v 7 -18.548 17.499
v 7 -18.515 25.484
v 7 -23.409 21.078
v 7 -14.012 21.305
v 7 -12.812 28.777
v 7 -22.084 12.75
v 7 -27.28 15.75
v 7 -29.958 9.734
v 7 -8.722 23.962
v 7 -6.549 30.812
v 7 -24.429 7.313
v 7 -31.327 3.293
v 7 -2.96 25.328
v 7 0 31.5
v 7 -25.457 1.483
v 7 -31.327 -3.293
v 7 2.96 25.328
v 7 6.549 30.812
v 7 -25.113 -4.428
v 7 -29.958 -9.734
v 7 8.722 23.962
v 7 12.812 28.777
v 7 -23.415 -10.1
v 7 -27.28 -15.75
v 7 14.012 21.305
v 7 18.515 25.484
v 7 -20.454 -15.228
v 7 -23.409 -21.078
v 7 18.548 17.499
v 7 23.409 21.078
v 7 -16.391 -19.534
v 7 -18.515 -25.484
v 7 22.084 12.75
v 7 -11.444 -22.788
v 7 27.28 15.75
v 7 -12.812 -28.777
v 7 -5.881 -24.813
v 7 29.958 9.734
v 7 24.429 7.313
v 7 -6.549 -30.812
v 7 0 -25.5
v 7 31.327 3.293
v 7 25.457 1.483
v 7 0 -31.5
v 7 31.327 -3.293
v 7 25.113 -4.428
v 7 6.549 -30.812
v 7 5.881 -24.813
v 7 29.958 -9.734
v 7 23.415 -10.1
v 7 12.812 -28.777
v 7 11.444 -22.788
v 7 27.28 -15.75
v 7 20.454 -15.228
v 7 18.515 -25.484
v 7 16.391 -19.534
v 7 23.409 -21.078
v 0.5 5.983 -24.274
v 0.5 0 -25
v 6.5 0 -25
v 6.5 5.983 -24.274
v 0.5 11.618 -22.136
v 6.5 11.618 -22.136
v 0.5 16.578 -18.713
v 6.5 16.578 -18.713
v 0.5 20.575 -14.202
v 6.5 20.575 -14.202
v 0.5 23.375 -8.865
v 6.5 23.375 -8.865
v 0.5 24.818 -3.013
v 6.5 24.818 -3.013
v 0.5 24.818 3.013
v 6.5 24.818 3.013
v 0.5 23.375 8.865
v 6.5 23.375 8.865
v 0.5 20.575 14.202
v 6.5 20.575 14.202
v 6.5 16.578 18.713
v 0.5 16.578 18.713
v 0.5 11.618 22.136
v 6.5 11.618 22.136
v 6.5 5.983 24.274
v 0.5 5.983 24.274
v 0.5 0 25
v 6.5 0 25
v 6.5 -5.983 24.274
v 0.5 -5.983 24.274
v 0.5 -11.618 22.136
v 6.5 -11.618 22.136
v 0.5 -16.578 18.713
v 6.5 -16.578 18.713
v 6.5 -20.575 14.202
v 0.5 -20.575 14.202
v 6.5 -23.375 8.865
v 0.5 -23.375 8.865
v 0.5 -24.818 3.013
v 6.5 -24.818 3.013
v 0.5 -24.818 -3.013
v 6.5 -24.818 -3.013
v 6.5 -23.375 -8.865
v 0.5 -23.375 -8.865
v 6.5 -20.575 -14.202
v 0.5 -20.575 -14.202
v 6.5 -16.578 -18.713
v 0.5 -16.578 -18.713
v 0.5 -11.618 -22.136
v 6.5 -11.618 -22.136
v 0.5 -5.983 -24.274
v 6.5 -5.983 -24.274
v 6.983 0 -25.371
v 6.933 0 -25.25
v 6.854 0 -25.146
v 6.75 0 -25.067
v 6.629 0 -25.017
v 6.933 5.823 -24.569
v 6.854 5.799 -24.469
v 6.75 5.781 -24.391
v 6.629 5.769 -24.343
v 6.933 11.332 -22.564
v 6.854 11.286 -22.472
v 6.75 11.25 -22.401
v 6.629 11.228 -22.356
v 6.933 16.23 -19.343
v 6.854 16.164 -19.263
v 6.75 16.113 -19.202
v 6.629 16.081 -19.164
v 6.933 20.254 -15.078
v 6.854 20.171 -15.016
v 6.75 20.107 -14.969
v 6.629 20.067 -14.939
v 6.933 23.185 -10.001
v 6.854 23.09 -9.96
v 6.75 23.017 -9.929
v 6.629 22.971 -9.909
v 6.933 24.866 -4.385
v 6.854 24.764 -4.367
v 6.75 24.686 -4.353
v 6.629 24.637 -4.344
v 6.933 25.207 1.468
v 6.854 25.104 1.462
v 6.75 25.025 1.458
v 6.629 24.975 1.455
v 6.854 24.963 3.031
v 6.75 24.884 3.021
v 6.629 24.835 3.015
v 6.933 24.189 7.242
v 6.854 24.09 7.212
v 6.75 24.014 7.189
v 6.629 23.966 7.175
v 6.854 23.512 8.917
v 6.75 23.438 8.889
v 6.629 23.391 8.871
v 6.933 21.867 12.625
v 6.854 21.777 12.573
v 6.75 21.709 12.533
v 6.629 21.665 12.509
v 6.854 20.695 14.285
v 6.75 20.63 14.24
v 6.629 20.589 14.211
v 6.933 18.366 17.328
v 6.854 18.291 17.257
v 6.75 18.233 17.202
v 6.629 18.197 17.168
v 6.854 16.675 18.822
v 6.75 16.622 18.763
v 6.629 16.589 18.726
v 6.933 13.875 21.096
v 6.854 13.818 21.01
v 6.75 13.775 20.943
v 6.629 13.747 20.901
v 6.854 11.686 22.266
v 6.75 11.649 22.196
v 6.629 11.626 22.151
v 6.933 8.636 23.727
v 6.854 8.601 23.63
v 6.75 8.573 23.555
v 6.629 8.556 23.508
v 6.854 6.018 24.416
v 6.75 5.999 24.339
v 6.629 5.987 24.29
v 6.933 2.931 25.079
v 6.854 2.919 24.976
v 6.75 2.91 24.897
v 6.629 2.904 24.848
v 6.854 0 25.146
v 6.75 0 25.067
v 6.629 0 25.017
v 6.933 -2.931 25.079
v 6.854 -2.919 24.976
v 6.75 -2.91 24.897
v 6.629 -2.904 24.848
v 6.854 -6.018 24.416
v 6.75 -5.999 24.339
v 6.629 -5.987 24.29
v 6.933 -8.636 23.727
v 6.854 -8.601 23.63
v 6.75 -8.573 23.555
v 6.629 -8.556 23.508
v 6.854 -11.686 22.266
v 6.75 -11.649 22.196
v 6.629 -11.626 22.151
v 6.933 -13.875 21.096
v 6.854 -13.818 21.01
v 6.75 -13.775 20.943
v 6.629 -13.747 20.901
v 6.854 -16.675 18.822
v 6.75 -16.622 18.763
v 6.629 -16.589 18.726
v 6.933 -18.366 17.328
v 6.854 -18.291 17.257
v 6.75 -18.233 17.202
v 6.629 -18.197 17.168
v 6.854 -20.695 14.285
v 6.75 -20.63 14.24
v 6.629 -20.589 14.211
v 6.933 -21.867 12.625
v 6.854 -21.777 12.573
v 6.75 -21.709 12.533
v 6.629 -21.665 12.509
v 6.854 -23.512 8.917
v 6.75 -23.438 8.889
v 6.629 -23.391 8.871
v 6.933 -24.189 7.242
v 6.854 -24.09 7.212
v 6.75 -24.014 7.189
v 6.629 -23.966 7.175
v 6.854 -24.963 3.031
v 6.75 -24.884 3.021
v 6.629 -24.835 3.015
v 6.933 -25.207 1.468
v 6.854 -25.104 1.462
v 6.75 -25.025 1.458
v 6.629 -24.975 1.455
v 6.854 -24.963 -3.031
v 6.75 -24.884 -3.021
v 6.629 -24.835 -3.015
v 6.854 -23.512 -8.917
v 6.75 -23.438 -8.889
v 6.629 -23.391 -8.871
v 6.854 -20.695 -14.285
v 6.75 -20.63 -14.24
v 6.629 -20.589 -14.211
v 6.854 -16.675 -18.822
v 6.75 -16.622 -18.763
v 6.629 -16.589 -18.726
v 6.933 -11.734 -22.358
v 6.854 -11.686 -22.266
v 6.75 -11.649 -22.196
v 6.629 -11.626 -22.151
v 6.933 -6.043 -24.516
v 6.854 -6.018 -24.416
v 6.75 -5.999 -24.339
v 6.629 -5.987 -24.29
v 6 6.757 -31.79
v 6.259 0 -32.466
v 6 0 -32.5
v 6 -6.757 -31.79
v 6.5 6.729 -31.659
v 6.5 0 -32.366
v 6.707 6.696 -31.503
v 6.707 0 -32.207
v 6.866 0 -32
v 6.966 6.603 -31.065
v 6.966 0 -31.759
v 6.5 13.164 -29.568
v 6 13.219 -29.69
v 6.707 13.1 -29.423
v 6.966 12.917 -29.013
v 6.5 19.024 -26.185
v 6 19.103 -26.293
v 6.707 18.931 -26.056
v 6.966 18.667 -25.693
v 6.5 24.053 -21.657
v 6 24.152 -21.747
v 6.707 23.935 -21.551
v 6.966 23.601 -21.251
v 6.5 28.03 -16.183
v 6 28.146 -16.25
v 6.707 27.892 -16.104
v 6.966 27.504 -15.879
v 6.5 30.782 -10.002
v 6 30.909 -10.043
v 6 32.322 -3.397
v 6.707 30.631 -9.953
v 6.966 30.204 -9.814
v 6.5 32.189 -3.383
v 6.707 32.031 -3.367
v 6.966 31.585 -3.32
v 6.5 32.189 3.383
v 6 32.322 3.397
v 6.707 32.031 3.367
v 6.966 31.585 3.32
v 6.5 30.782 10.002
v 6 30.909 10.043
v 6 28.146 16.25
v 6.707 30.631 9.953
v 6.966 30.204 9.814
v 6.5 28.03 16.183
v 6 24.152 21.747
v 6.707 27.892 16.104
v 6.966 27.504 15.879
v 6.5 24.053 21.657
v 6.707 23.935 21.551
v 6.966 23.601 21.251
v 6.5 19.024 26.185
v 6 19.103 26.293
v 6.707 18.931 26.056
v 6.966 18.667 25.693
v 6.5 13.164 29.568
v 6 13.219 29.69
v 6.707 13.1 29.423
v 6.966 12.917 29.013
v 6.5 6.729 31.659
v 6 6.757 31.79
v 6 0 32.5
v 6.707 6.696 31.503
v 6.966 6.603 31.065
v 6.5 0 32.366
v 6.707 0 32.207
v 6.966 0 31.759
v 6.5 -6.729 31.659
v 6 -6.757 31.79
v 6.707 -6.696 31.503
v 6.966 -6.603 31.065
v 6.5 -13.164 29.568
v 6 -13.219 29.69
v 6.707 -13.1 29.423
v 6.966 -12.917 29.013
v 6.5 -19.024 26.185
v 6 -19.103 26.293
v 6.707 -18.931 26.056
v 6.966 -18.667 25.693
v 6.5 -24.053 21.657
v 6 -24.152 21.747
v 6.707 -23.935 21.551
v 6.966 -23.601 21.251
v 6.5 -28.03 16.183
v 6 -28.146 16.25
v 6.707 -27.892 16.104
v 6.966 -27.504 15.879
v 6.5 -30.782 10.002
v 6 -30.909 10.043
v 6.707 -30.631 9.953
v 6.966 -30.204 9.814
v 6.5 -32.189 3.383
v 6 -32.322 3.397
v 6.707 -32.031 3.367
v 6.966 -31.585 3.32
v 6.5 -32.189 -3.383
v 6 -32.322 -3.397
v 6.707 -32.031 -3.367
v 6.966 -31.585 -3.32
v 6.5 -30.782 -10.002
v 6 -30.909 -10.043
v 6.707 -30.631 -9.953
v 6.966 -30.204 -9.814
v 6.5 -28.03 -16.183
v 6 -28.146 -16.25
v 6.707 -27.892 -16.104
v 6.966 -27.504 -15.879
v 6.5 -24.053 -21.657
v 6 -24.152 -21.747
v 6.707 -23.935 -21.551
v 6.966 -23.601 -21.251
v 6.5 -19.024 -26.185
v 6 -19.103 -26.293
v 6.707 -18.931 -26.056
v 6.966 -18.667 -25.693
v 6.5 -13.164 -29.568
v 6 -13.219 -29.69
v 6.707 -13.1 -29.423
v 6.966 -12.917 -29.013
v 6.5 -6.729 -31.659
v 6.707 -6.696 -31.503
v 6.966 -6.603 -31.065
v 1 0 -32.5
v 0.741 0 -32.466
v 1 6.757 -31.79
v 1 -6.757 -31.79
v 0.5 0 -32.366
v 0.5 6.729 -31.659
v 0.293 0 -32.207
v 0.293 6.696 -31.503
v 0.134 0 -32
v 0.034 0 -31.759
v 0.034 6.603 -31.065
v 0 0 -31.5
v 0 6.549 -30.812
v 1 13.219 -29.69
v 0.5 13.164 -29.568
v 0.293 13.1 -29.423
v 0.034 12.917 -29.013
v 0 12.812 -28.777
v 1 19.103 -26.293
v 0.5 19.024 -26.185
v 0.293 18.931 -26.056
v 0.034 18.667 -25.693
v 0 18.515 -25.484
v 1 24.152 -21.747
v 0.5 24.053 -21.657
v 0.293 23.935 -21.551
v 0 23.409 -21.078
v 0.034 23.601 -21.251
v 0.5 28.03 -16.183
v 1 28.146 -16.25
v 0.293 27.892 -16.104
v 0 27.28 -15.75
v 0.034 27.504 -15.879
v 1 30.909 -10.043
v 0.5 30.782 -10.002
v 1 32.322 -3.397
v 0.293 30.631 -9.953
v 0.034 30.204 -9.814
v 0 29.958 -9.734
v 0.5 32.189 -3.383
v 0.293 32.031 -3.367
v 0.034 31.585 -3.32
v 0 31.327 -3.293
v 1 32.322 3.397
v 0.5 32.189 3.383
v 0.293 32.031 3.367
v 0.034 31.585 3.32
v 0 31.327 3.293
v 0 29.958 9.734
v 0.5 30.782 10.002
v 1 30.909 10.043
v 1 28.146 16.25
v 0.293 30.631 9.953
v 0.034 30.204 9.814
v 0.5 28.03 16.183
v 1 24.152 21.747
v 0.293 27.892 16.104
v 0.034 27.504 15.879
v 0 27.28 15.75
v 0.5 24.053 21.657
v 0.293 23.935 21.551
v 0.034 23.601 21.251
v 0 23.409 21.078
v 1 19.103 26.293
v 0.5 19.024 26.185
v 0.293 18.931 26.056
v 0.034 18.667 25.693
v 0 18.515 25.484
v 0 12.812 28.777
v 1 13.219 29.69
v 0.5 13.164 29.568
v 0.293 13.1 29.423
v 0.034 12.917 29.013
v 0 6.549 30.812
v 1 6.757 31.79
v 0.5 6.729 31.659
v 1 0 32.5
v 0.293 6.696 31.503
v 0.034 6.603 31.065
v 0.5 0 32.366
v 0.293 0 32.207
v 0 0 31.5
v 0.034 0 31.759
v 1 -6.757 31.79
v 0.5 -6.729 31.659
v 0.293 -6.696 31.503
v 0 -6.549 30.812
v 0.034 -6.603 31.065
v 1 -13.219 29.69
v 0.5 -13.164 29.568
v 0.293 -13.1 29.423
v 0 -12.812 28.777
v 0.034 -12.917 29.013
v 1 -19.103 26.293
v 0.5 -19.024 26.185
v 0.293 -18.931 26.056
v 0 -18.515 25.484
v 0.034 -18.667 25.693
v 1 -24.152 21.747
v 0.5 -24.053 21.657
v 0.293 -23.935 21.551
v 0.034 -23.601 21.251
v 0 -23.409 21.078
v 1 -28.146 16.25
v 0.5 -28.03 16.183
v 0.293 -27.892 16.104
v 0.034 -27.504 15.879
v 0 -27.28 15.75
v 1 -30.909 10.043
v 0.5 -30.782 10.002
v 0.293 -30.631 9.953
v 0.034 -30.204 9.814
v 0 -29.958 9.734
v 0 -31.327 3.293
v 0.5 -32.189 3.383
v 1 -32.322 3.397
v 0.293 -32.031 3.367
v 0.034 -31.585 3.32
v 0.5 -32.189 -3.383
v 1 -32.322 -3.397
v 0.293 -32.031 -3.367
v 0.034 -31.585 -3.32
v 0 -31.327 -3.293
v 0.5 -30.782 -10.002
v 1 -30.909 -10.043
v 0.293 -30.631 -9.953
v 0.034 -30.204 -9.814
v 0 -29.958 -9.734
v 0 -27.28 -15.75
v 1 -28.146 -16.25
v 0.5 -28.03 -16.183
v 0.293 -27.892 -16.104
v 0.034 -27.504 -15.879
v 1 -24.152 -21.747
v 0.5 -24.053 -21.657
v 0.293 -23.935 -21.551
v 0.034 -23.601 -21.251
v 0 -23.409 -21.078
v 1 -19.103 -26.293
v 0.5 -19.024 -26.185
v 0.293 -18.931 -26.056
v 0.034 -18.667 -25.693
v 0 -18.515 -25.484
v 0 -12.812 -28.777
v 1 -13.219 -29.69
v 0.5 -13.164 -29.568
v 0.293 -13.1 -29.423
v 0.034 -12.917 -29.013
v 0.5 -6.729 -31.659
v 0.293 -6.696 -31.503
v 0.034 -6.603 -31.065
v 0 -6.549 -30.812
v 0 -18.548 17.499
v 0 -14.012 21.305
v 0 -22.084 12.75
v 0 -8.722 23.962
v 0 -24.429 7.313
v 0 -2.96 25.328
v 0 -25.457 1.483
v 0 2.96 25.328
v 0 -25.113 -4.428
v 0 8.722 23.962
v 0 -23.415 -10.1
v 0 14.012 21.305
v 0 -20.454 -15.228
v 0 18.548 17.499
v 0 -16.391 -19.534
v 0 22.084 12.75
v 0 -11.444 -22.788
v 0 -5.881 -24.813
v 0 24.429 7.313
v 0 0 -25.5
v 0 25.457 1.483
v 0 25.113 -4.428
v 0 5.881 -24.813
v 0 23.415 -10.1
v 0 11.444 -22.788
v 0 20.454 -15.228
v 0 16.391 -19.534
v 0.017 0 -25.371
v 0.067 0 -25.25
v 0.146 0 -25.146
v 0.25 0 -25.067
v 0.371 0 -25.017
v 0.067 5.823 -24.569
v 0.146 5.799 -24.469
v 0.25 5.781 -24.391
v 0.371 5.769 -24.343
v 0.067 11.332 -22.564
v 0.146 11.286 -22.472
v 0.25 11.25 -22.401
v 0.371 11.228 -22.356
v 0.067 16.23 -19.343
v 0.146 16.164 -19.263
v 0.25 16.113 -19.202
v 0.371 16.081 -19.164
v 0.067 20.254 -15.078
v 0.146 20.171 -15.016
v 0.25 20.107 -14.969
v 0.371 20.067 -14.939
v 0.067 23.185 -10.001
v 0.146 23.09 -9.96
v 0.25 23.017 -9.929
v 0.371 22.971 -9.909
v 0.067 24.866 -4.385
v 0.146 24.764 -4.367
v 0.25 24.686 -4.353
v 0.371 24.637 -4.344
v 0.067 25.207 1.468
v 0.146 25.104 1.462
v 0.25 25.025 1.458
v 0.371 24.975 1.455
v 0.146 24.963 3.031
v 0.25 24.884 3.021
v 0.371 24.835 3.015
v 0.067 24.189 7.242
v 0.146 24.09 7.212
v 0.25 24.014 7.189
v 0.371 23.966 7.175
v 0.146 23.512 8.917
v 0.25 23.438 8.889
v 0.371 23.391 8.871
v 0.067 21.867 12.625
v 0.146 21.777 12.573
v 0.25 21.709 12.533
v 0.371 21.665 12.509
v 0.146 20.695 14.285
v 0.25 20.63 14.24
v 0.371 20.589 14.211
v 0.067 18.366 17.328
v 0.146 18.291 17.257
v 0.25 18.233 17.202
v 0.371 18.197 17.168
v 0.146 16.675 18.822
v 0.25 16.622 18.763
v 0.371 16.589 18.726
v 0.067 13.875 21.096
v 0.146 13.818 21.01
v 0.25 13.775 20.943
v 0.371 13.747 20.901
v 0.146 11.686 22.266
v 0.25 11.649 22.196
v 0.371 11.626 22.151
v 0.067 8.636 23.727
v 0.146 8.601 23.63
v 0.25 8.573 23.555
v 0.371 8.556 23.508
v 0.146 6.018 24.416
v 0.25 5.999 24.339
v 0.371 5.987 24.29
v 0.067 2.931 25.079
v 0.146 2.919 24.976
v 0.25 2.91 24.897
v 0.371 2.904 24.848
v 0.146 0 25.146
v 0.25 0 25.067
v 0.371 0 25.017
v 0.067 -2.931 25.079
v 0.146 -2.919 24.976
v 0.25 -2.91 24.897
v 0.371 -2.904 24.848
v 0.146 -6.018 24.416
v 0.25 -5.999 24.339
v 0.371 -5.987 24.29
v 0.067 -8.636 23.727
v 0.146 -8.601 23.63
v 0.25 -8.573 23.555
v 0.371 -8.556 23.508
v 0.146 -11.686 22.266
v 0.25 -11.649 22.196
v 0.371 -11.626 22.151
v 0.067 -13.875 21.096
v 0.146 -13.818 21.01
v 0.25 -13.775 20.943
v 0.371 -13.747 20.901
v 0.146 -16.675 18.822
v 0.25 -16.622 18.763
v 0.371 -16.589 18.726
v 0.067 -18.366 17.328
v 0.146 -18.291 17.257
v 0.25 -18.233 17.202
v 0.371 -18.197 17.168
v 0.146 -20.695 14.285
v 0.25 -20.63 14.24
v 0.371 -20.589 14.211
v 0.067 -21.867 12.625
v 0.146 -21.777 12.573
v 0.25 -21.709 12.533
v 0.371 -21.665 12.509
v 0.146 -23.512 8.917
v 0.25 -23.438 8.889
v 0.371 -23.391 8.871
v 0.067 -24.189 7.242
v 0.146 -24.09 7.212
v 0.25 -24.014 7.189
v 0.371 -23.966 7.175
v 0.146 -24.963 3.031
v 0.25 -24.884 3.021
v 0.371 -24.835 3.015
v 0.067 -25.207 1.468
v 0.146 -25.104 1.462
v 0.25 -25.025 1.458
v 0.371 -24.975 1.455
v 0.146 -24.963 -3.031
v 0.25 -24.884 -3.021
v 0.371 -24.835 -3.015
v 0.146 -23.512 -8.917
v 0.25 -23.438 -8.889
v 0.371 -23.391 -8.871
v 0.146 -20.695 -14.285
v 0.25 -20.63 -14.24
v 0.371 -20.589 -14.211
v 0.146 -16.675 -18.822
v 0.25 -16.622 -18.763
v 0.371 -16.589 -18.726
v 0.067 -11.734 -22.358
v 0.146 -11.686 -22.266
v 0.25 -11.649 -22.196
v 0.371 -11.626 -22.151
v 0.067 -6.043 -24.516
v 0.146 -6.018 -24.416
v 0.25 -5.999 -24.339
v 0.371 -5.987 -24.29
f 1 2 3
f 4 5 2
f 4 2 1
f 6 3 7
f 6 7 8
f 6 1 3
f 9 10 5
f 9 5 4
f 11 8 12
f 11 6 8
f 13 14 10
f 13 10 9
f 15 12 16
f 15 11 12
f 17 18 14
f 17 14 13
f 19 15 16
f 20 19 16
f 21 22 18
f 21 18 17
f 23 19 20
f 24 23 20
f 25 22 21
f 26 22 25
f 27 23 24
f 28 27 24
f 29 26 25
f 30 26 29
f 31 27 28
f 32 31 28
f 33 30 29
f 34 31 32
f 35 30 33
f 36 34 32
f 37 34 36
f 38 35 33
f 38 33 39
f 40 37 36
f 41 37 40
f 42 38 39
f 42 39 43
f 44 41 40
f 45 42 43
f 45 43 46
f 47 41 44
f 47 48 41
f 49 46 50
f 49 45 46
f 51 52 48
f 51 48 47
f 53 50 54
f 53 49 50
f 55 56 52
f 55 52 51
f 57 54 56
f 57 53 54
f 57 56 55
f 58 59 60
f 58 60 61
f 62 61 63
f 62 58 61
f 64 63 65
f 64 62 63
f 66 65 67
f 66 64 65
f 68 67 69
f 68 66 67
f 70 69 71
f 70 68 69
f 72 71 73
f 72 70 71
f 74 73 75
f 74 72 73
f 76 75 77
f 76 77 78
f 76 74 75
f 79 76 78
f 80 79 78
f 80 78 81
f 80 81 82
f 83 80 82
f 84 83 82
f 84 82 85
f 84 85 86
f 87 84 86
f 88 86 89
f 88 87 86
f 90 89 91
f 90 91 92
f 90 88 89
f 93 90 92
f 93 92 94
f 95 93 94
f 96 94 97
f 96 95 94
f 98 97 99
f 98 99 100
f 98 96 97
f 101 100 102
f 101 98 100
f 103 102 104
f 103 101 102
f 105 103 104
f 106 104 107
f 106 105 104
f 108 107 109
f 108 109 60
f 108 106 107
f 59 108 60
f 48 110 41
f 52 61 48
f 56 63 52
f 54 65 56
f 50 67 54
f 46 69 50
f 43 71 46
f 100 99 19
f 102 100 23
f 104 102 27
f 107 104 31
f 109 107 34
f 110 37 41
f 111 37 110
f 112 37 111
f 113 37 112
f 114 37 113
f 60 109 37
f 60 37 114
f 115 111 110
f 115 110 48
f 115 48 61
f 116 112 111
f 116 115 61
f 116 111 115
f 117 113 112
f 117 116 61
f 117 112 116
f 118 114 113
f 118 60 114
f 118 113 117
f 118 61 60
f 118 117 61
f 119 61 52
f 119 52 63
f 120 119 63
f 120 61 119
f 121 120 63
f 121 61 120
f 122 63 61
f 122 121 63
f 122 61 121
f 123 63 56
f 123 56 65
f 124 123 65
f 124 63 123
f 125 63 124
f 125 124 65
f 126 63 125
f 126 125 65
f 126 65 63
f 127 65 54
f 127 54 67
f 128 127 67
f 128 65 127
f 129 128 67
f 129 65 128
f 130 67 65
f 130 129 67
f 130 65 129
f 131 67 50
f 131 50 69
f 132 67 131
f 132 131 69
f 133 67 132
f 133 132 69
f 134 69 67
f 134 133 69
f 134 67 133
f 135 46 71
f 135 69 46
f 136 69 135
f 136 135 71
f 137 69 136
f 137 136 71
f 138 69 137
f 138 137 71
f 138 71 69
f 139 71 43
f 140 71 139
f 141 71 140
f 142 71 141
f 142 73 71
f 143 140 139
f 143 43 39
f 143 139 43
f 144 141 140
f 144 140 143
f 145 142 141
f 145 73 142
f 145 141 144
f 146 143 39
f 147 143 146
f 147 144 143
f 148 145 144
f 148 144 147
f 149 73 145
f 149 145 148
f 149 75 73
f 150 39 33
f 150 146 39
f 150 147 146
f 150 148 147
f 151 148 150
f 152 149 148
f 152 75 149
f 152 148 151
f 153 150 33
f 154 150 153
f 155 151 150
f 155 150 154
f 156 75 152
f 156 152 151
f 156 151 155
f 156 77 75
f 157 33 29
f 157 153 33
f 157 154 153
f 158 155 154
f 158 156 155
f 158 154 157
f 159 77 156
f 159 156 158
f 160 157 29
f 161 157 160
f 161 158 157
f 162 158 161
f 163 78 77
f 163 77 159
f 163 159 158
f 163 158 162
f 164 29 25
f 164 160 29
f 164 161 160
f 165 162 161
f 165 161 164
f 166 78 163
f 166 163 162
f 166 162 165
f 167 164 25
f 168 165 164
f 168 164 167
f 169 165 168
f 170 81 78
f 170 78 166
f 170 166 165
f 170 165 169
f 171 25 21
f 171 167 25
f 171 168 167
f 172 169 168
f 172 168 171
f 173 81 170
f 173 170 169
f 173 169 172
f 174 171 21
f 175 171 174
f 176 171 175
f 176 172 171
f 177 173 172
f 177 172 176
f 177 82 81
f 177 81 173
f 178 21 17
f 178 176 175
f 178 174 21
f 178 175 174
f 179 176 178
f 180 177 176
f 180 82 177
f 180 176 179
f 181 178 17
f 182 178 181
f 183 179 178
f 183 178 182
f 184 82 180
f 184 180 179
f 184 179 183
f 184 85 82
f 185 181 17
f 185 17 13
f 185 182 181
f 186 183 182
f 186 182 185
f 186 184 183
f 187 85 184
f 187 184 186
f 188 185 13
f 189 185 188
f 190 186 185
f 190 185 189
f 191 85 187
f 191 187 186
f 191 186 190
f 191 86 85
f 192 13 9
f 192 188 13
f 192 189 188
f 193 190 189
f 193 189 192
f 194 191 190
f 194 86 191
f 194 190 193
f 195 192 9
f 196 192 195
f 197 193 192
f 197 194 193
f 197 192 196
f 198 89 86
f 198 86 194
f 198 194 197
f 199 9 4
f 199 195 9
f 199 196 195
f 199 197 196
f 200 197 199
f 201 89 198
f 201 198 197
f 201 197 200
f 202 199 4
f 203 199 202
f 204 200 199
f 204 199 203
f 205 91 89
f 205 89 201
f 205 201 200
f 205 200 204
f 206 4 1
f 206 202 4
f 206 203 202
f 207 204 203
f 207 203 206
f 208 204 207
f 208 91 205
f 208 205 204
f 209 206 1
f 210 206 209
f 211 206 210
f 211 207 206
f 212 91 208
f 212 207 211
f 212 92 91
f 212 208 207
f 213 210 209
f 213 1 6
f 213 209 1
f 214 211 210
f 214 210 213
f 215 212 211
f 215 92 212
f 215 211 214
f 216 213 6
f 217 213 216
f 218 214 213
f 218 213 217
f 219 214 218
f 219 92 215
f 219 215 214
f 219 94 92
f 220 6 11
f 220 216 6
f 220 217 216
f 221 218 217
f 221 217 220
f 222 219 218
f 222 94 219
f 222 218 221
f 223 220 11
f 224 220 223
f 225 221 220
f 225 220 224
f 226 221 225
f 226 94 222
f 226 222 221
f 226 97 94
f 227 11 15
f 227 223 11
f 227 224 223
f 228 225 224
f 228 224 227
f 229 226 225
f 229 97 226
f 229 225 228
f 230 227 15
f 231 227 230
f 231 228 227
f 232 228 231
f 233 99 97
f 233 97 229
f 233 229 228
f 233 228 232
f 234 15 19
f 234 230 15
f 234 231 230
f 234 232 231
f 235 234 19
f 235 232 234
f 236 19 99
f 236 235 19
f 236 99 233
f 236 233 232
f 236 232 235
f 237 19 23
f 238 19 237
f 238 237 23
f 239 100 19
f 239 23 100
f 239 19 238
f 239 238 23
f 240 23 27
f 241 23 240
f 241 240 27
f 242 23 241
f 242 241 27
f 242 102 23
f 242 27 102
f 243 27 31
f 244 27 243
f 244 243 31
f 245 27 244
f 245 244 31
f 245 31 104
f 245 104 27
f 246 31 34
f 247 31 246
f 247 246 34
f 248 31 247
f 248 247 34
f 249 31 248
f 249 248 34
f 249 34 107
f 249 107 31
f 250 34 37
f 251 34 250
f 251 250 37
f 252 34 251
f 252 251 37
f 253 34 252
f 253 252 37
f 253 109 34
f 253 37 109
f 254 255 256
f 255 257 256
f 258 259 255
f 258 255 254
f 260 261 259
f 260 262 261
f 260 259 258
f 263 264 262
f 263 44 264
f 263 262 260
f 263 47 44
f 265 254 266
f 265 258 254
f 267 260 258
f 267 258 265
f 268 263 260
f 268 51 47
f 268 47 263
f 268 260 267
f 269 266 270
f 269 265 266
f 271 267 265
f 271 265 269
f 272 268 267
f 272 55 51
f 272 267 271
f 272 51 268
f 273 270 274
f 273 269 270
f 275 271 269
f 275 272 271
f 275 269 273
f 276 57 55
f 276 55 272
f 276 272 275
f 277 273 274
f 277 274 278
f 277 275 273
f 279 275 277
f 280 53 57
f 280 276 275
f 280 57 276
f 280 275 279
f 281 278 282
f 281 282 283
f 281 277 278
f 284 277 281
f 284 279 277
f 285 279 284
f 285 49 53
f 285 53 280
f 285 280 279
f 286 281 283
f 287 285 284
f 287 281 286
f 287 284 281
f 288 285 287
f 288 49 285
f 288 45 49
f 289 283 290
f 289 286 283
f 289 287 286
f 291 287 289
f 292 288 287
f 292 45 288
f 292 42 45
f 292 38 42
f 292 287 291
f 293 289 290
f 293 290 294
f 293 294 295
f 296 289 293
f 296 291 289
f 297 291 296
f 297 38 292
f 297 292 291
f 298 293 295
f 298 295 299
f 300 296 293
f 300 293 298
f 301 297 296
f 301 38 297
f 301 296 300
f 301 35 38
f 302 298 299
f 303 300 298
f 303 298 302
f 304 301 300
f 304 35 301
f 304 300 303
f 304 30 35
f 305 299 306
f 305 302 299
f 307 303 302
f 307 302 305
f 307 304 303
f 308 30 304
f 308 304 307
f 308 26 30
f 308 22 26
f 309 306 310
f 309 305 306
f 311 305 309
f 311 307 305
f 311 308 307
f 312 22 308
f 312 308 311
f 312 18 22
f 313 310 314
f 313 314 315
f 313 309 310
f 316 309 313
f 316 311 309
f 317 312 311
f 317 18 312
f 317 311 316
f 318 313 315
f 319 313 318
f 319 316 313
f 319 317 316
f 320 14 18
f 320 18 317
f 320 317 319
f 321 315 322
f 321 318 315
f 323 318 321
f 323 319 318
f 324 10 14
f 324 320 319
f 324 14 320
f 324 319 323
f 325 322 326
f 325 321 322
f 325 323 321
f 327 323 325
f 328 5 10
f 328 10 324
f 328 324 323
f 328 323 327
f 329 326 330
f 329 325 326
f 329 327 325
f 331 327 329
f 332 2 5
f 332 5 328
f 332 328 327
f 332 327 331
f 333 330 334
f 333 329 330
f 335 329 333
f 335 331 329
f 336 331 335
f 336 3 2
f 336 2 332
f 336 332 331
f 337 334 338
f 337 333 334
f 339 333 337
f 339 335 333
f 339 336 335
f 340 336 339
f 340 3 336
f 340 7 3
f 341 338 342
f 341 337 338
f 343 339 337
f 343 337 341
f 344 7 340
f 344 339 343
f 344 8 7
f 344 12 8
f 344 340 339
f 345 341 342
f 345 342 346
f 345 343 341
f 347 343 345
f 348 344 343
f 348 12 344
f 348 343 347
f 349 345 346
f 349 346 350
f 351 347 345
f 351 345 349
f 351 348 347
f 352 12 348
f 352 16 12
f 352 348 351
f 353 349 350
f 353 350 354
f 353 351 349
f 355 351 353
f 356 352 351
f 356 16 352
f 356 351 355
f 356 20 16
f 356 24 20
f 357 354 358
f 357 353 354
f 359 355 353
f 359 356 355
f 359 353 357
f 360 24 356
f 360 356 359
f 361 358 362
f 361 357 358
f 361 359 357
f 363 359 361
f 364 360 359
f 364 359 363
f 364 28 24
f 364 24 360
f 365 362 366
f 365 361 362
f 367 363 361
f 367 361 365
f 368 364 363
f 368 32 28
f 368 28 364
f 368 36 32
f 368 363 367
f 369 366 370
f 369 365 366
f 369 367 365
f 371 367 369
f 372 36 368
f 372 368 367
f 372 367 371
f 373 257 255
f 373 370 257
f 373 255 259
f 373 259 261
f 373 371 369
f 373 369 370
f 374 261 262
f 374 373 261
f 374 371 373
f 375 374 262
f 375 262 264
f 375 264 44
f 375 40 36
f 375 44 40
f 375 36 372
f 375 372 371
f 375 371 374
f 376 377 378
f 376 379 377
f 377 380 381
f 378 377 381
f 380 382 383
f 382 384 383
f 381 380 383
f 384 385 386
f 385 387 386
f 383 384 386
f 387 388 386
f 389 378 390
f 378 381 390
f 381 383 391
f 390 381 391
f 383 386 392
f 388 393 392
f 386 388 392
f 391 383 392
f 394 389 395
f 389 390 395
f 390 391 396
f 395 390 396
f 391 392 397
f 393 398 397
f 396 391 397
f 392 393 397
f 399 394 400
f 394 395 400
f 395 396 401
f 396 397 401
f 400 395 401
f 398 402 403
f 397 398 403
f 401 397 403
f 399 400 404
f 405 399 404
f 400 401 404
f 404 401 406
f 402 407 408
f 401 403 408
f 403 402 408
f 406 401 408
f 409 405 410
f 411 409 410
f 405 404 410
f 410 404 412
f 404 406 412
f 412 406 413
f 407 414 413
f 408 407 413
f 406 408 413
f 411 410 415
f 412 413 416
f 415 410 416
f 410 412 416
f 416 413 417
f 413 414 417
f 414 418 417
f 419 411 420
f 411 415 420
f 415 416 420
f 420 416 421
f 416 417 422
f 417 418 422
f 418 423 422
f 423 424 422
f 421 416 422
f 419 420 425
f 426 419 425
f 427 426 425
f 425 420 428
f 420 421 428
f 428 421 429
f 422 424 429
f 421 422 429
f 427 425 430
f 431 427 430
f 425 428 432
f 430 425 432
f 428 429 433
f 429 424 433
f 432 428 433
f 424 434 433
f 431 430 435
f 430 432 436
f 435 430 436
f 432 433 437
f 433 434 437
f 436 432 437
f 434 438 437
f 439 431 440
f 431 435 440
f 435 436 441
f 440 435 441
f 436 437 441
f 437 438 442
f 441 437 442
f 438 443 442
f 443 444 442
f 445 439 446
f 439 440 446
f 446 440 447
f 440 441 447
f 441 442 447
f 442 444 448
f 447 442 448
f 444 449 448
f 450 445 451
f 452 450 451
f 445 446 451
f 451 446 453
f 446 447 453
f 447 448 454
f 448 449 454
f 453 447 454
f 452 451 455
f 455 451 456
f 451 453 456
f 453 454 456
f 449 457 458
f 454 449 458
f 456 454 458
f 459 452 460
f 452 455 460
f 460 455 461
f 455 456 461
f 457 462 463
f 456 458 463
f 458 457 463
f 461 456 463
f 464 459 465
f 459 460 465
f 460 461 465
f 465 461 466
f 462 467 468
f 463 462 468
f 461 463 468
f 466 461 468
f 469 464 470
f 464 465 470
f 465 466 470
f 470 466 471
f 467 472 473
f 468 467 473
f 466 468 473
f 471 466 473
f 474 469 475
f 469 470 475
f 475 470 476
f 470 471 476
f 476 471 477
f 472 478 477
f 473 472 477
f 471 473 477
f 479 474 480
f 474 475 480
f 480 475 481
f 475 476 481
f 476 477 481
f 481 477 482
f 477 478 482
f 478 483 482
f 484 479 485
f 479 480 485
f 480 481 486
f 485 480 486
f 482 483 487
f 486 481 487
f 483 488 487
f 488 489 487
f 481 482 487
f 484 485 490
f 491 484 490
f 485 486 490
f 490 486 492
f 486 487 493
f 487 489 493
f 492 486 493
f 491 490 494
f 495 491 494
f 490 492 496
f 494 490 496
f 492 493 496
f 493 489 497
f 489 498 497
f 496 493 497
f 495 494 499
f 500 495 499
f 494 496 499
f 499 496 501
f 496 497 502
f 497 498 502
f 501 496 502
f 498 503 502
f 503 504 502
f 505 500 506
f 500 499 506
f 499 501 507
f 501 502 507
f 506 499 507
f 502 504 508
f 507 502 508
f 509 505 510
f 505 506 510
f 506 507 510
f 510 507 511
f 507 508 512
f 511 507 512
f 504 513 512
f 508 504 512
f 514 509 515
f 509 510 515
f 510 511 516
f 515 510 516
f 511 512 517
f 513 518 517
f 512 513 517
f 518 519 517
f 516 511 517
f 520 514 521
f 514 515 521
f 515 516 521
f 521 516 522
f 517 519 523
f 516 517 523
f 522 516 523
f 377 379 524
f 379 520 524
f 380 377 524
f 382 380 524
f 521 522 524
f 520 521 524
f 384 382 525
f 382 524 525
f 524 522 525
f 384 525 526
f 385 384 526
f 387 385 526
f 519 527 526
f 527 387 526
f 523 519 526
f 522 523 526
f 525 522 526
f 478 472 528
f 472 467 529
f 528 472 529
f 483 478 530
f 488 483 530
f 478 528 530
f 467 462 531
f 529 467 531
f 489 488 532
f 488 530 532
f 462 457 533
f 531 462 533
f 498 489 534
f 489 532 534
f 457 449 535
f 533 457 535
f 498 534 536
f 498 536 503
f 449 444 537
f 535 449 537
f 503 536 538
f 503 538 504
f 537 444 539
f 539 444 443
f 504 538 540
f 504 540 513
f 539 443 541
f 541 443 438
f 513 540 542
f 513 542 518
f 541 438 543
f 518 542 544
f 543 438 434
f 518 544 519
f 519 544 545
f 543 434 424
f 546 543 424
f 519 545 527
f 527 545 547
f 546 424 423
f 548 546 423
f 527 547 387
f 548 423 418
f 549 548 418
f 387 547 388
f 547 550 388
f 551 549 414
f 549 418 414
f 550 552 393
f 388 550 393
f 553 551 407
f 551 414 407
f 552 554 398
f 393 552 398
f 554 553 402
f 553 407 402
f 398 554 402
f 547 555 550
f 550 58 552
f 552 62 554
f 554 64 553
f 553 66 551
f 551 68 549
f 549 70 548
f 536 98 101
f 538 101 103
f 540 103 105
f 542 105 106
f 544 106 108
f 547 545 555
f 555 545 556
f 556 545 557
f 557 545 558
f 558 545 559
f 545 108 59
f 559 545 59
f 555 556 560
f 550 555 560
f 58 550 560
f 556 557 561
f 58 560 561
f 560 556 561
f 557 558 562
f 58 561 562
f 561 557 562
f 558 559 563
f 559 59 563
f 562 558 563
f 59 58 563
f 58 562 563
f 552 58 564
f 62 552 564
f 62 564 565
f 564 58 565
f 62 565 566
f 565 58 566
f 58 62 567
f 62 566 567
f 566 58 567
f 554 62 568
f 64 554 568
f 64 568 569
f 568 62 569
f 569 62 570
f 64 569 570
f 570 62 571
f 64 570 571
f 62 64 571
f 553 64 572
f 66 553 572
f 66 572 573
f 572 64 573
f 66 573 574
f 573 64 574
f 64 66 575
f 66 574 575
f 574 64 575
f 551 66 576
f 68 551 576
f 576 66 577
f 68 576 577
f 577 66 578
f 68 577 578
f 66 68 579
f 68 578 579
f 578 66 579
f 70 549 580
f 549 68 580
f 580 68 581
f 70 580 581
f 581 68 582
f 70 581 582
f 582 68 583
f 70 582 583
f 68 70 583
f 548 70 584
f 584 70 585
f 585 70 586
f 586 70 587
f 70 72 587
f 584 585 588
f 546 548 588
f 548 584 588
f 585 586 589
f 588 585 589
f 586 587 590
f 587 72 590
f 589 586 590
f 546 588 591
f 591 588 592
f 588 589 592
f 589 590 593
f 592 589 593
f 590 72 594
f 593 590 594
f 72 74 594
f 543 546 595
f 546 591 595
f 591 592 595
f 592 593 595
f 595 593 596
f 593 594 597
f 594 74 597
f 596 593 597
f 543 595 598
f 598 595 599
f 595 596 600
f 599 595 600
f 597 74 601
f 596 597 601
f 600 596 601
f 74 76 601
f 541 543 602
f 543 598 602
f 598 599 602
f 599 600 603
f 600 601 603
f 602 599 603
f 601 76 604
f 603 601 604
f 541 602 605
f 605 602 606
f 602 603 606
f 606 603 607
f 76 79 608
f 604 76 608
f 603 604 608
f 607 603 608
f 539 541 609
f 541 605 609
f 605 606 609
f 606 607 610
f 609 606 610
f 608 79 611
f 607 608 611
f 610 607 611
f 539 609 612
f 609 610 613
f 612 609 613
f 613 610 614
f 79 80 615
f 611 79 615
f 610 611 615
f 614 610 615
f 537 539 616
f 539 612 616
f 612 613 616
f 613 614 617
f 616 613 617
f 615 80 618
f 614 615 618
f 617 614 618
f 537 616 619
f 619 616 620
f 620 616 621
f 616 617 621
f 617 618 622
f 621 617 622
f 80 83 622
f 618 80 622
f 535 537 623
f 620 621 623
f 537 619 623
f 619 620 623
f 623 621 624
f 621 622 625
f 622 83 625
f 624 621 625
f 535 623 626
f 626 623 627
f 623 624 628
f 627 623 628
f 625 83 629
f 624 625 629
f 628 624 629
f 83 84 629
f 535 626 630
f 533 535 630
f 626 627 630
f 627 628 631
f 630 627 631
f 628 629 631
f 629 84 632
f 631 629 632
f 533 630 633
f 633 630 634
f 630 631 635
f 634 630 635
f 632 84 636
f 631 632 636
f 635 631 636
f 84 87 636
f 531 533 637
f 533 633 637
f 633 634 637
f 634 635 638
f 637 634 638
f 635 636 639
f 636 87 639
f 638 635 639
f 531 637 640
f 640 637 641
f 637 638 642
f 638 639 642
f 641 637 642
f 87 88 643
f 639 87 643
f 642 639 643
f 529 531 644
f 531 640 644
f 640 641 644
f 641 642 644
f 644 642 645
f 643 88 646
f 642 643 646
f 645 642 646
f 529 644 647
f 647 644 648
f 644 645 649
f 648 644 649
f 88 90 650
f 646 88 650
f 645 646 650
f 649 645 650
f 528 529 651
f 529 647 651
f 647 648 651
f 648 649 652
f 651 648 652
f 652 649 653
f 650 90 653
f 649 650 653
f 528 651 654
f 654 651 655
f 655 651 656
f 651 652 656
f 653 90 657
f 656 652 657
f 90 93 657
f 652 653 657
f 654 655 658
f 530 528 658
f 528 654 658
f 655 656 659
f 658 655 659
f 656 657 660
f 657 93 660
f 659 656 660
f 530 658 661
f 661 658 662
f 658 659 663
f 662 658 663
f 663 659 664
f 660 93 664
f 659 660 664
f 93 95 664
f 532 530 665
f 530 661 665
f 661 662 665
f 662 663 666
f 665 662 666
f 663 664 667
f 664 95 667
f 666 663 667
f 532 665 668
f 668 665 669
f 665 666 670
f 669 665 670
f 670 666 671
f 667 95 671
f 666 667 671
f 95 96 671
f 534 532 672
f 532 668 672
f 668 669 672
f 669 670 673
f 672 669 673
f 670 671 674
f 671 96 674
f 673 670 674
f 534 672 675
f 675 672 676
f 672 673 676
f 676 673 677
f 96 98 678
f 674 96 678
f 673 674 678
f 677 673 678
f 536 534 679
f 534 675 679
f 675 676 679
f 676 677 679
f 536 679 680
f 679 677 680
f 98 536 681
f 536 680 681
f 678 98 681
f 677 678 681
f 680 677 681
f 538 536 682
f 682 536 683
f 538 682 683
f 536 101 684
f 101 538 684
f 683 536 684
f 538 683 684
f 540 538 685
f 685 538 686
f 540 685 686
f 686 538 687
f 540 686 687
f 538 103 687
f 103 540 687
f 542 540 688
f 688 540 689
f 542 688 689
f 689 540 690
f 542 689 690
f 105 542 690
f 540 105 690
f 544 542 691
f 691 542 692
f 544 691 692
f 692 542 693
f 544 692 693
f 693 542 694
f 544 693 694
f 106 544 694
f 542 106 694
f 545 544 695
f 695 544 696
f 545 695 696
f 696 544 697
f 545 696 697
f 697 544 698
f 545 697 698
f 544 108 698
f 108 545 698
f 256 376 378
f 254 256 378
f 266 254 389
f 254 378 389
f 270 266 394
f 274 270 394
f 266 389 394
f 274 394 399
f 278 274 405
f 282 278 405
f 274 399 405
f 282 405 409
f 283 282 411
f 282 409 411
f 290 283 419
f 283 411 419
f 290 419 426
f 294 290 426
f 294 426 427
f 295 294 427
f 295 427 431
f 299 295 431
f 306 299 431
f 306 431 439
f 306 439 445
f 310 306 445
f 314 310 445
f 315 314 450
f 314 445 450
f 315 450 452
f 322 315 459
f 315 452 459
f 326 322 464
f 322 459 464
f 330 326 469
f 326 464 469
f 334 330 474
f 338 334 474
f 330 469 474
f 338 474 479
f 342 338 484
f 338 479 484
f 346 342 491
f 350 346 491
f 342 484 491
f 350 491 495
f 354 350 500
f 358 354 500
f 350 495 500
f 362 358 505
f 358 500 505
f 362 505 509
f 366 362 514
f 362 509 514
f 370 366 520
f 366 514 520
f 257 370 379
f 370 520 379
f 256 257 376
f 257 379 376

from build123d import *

# Parameters (mm, degrees)
SKETCH1_R           = 32.5
SKETCH1_R_2         = 25
BOSS_EXTRUDE1_DEPTH = 7
FILLET1_R           = 1
FILLET2_R           = 0.5


with BuildPart() as part:
    # Sketch1 → Boss-Extrude1 (new body)
    with BuildSketch(Plane(origin=(0, 0, 0), x_dir=(0, 0, -1), z_dir=(1, 0, 0))):
        Circle(SKETCH1_R)
        Circle(SKETCH1_R_2, mode=Mode.SUBTRACT)
    extrude(amount=BOSS_EXTRUDE1_DEPTH)

    # Fillet1
    fillet1_edges = [part.edges().sort_by_distance(p)[0] for p in [
        (0, 0, 32.5),
        (7, 0, 32.5),
    ]]
    fillet(fillet1_edges, radius=FILLET1_R)

    # Fillet2
    fillet2_edges = [part.edges().sort_by_distance(p)[0] for p in [
        (0, 0, 25),
        (7, 0, 25),
    ]]
    fillet(fillet2_edges, radius=FILLET2_R)


solid = part.part
